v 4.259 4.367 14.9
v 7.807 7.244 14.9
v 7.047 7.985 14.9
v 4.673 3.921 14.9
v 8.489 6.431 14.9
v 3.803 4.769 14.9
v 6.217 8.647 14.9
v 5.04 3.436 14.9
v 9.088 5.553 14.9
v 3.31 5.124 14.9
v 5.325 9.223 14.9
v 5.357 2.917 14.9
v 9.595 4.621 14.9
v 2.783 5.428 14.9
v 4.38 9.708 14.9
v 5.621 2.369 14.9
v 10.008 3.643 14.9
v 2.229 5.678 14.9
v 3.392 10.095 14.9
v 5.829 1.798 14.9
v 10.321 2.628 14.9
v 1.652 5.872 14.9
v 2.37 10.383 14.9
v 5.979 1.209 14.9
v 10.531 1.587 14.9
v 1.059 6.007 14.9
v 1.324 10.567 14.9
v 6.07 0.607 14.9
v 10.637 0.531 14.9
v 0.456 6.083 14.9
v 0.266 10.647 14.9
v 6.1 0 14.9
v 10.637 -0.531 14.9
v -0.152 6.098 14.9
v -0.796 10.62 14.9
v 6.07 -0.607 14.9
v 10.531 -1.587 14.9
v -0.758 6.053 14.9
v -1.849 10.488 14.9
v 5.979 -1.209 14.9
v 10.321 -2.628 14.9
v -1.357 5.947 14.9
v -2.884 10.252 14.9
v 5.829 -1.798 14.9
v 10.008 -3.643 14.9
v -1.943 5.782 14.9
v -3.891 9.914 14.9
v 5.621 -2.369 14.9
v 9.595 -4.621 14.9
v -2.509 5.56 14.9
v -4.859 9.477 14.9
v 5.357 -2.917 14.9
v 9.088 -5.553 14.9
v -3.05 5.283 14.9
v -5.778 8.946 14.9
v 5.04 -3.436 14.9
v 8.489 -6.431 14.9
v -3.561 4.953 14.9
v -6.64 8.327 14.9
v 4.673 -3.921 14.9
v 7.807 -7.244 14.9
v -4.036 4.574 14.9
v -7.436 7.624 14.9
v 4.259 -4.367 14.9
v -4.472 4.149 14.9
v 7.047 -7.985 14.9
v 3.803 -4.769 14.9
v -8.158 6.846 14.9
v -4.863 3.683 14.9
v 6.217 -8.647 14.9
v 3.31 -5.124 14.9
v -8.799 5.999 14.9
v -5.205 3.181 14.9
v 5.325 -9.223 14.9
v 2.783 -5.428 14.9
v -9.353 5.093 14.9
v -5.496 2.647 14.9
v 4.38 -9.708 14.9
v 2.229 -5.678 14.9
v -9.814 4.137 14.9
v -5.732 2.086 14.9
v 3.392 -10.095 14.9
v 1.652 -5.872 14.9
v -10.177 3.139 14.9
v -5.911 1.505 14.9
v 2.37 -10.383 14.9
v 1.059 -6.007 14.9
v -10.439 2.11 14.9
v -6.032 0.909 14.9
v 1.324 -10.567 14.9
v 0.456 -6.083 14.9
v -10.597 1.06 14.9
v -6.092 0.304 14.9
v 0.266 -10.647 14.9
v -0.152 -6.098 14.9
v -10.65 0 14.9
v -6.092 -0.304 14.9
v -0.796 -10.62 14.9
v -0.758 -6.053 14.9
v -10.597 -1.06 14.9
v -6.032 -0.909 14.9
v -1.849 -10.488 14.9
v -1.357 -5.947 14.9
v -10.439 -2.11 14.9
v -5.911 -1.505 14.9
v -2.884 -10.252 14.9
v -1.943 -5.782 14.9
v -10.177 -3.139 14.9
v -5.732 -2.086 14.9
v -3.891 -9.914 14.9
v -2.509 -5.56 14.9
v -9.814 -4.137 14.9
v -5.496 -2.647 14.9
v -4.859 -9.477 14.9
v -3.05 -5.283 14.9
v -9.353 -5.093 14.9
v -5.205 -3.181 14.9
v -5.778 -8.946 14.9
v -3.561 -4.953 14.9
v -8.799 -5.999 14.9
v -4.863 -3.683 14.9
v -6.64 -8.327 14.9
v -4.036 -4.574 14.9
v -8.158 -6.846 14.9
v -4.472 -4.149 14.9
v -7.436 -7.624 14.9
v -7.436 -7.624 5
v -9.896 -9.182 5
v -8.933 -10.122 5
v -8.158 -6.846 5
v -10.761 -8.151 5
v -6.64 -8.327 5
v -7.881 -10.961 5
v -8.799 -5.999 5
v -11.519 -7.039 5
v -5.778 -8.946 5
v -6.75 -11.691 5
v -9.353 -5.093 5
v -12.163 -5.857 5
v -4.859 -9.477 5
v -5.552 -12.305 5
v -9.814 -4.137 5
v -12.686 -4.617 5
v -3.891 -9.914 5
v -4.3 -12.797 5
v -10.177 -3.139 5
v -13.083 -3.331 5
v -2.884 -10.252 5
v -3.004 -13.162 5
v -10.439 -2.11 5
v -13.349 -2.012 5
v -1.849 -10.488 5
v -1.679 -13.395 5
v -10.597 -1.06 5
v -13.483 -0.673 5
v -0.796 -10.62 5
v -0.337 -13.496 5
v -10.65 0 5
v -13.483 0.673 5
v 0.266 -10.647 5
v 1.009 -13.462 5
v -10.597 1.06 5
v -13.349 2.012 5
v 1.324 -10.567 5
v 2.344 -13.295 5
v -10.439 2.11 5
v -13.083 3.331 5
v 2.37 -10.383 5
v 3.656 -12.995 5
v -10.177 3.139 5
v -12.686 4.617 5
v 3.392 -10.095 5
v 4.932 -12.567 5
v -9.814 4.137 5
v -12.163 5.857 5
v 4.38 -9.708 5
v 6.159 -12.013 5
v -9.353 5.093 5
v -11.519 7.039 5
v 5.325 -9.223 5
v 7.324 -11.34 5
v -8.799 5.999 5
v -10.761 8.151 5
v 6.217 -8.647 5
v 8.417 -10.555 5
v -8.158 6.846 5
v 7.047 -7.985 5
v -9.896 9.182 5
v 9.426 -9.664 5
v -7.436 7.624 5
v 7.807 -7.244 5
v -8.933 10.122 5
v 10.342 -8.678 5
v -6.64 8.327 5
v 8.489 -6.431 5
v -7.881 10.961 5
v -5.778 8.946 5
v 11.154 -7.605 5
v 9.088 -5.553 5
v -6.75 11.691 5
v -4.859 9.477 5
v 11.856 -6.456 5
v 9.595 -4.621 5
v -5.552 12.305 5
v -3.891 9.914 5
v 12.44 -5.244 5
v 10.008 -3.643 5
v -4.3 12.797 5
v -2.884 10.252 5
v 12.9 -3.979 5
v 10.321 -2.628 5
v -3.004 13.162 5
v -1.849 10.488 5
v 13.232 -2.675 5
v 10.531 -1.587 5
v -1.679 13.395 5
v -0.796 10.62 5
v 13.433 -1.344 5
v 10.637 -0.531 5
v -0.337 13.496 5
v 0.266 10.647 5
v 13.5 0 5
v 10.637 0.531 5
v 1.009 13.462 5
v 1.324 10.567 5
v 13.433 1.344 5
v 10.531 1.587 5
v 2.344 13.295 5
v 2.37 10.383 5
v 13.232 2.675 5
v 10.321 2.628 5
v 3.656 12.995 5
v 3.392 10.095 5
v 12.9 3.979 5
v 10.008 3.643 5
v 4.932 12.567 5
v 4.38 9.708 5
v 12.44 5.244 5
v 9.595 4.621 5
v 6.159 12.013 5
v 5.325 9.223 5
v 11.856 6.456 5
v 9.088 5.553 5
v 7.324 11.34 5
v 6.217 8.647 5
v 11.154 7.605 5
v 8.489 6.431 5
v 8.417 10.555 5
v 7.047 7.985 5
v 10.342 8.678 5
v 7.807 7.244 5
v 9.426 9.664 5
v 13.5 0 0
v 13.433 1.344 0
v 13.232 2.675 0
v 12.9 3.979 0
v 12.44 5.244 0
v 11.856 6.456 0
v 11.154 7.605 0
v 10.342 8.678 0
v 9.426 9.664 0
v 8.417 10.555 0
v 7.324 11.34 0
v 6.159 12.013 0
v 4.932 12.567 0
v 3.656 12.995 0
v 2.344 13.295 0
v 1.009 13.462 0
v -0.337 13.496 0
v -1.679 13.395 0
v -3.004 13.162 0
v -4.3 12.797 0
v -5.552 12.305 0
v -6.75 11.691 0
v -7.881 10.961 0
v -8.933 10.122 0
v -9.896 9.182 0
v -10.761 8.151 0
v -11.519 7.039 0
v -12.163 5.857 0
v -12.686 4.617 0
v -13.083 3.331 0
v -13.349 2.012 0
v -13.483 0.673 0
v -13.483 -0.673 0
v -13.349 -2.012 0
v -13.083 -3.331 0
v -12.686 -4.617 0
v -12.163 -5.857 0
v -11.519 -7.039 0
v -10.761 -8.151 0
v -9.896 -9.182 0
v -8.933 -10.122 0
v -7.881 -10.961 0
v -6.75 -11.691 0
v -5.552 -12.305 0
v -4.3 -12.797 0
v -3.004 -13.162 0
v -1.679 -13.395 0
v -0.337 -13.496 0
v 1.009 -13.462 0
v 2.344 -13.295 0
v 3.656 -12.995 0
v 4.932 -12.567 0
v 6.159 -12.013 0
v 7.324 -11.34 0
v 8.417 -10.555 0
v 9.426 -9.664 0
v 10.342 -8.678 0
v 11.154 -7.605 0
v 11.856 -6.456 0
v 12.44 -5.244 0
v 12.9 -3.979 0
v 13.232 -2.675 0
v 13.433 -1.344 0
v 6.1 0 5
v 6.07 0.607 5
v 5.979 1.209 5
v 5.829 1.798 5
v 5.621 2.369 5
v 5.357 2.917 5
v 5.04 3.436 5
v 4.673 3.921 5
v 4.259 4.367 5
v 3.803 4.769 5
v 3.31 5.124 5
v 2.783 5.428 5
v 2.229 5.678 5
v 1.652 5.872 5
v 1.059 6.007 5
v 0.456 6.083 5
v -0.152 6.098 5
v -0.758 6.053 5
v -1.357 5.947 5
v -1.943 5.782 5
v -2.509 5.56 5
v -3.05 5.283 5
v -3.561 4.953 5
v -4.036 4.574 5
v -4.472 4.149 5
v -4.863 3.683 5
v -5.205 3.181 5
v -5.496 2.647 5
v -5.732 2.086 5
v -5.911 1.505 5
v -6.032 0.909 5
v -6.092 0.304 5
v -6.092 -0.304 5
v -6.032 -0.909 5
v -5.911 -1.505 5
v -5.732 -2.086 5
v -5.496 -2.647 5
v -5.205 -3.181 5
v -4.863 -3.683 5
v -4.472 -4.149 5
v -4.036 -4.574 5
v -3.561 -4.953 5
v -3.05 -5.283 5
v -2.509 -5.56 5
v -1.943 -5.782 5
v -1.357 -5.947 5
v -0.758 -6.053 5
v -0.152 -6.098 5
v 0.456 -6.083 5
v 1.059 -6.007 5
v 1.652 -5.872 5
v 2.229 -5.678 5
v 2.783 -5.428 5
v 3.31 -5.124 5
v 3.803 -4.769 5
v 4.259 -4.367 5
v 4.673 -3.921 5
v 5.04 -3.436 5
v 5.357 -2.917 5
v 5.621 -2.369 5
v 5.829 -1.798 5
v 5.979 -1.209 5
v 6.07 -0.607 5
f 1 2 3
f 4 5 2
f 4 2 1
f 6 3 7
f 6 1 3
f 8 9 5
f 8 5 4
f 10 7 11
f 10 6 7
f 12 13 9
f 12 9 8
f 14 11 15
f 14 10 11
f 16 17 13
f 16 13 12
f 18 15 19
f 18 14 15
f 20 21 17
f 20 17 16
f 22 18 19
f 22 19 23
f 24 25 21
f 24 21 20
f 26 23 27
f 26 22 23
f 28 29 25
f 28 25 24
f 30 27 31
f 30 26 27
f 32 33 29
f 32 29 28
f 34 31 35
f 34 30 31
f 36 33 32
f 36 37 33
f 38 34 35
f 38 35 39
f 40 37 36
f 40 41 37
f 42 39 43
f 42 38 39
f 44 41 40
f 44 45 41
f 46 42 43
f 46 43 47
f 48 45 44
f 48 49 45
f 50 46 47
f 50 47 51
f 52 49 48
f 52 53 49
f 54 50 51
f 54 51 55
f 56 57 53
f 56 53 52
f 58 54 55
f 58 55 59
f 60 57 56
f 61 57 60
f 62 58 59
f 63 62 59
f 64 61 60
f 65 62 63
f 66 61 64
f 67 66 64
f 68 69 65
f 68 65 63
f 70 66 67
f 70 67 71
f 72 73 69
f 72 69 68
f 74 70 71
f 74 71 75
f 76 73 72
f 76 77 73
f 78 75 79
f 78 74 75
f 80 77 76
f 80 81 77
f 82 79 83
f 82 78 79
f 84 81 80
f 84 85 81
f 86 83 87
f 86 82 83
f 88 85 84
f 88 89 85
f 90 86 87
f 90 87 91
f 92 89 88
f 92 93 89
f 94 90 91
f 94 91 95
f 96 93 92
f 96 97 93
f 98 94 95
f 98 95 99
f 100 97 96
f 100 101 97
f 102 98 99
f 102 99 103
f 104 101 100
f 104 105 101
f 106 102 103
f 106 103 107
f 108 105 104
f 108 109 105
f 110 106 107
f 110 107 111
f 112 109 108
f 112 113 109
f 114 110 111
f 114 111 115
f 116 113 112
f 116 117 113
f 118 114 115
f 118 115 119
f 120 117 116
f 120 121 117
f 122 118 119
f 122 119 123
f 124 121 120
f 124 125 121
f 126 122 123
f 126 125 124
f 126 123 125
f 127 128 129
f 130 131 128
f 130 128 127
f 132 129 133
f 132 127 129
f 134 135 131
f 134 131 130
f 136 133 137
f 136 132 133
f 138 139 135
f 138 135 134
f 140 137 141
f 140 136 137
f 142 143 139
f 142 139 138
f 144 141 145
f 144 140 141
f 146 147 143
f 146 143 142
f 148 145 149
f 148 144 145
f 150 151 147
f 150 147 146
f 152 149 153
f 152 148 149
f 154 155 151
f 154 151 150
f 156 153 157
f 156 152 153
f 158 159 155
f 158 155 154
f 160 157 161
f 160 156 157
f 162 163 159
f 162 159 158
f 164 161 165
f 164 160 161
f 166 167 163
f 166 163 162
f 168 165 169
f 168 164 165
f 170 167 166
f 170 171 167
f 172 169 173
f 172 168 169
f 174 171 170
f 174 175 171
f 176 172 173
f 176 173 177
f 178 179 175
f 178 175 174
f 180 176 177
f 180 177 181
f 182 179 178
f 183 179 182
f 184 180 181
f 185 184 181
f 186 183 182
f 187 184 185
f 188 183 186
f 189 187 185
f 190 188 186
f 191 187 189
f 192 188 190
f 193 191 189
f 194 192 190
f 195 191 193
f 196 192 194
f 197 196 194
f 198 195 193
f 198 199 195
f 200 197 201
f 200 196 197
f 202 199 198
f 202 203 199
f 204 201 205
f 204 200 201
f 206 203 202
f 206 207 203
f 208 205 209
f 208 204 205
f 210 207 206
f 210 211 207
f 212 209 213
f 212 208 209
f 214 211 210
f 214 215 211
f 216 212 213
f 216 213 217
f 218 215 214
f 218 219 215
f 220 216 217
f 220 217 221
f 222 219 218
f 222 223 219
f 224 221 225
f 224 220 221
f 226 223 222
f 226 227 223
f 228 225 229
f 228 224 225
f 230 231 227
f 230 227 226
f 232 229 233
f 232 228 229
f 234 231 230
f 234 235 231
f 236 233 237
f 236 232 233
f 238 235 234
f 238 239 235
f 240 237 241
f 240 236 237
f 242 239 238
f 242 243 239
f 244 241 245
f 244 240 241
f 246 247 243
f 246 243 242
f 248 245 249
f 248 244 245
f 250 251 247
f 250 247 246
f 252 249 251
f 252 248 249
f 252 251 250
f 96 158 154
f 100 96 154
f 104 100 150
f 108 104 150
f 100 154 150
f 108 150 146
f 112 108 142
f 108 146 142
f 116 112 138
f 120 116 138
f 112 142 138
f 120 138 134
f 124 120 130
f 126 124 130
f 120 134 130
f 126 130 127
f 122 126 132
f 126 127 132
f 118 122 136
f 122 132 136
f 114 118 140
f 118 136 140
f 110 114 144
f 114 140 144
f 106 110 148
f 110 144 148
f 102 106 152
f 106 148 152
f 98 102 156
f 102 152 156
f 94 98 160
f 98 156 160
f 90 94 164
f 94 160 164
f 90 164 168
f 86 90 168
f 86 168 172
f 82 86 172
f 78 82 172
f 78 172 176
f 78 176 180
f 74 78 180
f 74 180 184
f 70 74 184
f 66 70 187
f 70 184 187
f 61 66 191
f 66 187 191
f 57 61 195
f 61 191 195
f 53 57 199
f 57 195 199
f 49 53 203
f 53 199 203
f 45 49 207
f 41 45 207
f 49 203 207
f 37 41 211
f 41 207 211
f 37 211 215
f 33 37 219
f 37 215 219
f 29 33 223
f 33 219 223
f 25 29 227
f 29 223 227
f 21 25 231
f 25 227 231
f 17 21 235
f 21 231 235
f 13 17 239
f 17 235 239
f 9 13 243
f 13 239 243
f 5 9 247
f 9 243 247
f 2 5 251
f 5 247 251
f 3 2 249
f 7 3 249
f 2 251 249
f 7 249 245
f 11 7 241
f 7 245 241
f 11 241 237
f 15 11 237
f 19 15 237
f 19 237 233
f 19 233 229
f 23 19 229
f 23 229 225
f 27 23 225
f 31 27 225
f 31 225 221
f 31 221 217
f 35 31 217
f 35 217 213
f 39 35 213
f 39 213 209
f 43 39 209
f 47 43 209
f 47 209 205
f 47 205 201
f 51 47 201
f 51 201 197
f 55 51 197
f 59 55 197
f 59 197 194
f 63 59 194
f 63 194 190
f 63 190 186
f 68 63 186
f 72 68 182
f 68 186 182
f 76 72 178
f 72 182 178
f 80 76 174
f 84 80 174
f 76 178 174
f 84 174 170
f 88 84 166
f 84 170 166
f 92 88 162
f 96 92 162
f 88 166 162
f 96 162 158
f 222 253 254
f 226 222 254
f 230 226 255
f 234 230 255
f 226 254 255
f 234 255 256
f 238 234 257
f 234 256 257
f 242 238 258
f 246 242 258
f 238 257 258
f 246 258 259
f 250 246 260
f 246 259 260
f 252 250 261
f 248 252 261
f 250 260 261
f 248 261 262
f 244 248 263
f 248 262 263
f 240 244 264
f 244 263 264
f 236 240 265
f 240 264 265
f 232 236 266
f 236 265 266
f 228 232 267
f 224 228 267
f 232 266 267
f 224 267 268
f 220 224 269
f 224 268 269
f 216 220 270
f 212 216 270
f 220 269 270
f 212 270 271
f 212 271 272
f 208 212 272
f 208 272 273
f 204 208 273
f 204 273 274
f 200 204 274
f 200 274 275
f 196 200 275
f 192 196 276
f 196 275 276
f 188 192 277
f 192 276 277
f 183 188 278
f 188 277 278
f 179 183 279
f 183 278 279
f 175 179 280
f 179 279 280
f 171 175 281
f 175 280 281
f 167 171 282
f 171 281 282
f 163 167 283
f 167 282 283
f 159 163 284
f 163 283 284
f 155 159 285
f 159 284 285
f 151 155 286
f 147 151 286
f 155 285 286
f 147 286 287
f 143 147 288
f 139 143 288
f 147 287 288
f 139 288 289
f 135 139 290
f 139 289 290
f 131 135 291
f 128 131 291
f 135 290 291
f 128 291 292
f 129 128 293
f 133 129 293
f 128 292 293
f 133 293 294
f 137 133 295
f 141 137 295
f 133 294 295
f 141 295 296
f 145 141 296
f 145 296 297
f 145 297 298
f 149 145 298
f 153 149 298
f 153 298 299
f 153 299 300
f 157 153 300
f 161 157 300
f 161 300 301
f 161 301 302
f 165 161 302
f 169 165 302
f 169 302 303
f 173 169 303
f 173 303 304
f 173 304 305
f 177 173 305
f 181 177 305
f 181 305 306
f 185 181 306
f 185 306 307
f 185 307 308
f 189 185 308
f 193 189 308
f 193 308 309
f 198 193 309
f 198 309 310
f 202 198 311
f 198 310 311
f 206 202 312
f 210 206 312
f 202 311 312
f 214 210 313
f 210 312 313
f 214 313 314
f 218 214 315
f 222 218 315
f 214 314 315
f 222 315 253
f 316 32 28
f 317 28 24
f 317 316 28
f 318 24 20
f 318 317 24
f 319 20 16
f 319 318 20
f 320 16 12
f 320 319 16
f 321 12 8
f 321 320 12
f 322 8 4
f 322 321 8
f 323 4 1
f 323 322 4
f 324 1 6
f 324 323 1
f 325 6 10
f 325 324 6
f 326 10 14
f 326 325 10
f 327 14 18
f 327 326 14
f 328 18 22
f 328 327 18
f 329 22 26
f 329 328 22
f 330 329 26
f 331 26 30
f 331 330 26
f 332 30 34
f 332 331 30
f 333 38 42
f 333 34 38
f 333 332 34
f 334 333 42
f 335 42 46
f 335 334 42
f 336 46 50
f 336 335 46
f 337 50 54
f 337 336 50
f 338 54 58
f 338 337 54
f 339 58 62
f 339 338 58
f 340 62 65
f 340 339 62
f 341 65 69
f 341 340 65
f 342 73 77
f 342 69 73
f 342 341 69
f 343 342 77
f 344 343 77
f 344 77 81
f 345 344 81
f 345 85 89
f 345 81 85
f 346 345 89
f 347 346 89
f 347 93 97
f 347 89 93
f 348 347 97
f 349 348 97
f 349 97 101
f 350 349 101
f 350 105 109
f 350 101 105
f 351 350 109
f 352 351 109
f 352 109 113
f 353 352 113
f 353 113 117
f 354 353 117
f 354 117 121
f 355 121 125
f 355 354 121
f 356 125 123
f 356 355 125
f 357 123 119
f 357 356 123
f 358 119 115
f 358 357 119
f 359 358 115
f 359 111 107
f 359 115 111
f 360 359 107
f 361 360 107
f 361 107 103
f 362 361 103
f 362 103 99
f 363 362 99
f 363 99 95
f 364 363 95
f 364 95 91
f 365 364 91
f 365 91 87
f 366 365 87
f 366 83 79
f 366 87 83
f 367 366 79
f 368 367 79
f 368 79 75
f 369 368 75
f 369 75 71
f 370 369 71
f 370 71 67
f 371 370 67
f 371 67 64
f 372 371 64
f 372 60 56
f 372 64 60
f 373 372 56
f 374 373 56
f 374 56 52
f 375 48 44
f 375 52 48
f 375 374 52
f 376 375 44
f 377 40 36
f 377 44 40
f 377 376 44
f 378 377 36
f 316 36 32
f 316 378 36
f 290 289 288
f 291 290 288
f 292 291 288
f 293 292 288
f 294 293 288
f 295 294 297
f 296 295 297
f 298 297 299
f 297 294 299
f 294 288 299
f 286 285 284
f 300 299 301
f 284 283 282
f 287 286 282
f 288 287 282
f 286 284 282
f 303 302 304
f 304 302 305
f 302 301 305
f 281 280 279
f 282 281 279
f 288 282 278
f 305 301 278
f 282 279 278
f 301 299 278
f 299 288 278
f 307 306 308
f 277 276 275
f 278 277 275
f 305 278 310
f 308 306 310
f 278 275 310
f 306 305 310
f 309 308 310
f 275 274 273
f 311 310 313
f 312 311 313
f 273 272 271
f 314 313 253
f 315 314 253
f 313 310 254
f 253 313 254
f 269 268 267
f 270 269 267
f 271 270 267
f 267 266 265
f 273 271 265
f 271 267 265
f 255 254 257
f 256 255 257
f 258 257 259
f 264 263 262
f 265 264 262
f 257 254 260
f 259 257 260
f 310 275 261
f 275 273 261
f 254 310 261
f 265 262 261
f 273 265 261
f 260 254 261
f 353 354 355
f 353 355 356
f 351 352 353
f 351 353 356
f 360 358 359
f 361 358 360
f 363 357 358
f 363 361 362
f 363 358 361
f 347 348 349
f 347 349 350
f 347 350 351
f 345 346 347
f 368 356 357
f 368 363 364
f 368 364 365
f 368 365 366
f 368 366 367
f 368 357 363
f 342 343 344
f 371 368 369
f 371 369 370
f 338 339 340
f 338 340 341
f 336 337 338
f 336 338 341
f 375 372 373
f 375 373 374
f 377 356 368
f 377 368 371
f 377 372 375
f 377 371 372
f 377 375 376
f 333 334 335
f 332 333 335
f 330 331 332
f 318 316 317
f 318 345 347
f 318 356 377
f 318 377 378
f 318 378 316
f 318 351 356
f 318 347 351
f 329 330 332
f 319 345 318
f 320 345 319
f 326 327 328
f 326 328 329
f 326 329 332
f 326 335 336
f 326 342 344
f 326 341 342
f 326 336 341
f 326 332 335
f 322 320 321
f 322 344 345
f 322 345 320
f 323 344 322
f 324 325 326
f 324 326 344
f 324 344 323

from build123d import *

# Parameters (mm, degrees)
SKETCH1_R           = 13.5
BOSS_EXTRUDE1_DEPTH = 5
SKETCH2_R           = 10.65
BOSS_EXTRUDE2_DEPTH = 9.9
SKETCH5_R           = 6.1
CUT_EXTRUDE1_DEPTH  = 10


with BuildPart() as part:
    # Sketch1 → Boss-Extrude1 (new body)
    with BuildSketch(Plane.XY):
        Circle(SKETCH1_R)
    extrude(amount=BOSS_EXTRUDE1_DEPTH)

    # Sketch2 → Boss-Extrude2 (add)
    with BuildSketch(Plane.XY.offset(5)):
        with Locations(Location((0, 0, 0), (0, 0, 180))):
            Circle(SKETCH2_R)
    extrude(amount=BOSS_EXTRUDE2_DEPTH)

    # Sketch5 → Cut-Extrude1 (cut)
    with BuildSketch(Plane.XY.offset(5)):
        Circle(SKETCH5_R)
    extrude(amount=CUT_EXTRUDE1_DEPTH, mode=Mode.SUBTRACT)


solid = part.part
